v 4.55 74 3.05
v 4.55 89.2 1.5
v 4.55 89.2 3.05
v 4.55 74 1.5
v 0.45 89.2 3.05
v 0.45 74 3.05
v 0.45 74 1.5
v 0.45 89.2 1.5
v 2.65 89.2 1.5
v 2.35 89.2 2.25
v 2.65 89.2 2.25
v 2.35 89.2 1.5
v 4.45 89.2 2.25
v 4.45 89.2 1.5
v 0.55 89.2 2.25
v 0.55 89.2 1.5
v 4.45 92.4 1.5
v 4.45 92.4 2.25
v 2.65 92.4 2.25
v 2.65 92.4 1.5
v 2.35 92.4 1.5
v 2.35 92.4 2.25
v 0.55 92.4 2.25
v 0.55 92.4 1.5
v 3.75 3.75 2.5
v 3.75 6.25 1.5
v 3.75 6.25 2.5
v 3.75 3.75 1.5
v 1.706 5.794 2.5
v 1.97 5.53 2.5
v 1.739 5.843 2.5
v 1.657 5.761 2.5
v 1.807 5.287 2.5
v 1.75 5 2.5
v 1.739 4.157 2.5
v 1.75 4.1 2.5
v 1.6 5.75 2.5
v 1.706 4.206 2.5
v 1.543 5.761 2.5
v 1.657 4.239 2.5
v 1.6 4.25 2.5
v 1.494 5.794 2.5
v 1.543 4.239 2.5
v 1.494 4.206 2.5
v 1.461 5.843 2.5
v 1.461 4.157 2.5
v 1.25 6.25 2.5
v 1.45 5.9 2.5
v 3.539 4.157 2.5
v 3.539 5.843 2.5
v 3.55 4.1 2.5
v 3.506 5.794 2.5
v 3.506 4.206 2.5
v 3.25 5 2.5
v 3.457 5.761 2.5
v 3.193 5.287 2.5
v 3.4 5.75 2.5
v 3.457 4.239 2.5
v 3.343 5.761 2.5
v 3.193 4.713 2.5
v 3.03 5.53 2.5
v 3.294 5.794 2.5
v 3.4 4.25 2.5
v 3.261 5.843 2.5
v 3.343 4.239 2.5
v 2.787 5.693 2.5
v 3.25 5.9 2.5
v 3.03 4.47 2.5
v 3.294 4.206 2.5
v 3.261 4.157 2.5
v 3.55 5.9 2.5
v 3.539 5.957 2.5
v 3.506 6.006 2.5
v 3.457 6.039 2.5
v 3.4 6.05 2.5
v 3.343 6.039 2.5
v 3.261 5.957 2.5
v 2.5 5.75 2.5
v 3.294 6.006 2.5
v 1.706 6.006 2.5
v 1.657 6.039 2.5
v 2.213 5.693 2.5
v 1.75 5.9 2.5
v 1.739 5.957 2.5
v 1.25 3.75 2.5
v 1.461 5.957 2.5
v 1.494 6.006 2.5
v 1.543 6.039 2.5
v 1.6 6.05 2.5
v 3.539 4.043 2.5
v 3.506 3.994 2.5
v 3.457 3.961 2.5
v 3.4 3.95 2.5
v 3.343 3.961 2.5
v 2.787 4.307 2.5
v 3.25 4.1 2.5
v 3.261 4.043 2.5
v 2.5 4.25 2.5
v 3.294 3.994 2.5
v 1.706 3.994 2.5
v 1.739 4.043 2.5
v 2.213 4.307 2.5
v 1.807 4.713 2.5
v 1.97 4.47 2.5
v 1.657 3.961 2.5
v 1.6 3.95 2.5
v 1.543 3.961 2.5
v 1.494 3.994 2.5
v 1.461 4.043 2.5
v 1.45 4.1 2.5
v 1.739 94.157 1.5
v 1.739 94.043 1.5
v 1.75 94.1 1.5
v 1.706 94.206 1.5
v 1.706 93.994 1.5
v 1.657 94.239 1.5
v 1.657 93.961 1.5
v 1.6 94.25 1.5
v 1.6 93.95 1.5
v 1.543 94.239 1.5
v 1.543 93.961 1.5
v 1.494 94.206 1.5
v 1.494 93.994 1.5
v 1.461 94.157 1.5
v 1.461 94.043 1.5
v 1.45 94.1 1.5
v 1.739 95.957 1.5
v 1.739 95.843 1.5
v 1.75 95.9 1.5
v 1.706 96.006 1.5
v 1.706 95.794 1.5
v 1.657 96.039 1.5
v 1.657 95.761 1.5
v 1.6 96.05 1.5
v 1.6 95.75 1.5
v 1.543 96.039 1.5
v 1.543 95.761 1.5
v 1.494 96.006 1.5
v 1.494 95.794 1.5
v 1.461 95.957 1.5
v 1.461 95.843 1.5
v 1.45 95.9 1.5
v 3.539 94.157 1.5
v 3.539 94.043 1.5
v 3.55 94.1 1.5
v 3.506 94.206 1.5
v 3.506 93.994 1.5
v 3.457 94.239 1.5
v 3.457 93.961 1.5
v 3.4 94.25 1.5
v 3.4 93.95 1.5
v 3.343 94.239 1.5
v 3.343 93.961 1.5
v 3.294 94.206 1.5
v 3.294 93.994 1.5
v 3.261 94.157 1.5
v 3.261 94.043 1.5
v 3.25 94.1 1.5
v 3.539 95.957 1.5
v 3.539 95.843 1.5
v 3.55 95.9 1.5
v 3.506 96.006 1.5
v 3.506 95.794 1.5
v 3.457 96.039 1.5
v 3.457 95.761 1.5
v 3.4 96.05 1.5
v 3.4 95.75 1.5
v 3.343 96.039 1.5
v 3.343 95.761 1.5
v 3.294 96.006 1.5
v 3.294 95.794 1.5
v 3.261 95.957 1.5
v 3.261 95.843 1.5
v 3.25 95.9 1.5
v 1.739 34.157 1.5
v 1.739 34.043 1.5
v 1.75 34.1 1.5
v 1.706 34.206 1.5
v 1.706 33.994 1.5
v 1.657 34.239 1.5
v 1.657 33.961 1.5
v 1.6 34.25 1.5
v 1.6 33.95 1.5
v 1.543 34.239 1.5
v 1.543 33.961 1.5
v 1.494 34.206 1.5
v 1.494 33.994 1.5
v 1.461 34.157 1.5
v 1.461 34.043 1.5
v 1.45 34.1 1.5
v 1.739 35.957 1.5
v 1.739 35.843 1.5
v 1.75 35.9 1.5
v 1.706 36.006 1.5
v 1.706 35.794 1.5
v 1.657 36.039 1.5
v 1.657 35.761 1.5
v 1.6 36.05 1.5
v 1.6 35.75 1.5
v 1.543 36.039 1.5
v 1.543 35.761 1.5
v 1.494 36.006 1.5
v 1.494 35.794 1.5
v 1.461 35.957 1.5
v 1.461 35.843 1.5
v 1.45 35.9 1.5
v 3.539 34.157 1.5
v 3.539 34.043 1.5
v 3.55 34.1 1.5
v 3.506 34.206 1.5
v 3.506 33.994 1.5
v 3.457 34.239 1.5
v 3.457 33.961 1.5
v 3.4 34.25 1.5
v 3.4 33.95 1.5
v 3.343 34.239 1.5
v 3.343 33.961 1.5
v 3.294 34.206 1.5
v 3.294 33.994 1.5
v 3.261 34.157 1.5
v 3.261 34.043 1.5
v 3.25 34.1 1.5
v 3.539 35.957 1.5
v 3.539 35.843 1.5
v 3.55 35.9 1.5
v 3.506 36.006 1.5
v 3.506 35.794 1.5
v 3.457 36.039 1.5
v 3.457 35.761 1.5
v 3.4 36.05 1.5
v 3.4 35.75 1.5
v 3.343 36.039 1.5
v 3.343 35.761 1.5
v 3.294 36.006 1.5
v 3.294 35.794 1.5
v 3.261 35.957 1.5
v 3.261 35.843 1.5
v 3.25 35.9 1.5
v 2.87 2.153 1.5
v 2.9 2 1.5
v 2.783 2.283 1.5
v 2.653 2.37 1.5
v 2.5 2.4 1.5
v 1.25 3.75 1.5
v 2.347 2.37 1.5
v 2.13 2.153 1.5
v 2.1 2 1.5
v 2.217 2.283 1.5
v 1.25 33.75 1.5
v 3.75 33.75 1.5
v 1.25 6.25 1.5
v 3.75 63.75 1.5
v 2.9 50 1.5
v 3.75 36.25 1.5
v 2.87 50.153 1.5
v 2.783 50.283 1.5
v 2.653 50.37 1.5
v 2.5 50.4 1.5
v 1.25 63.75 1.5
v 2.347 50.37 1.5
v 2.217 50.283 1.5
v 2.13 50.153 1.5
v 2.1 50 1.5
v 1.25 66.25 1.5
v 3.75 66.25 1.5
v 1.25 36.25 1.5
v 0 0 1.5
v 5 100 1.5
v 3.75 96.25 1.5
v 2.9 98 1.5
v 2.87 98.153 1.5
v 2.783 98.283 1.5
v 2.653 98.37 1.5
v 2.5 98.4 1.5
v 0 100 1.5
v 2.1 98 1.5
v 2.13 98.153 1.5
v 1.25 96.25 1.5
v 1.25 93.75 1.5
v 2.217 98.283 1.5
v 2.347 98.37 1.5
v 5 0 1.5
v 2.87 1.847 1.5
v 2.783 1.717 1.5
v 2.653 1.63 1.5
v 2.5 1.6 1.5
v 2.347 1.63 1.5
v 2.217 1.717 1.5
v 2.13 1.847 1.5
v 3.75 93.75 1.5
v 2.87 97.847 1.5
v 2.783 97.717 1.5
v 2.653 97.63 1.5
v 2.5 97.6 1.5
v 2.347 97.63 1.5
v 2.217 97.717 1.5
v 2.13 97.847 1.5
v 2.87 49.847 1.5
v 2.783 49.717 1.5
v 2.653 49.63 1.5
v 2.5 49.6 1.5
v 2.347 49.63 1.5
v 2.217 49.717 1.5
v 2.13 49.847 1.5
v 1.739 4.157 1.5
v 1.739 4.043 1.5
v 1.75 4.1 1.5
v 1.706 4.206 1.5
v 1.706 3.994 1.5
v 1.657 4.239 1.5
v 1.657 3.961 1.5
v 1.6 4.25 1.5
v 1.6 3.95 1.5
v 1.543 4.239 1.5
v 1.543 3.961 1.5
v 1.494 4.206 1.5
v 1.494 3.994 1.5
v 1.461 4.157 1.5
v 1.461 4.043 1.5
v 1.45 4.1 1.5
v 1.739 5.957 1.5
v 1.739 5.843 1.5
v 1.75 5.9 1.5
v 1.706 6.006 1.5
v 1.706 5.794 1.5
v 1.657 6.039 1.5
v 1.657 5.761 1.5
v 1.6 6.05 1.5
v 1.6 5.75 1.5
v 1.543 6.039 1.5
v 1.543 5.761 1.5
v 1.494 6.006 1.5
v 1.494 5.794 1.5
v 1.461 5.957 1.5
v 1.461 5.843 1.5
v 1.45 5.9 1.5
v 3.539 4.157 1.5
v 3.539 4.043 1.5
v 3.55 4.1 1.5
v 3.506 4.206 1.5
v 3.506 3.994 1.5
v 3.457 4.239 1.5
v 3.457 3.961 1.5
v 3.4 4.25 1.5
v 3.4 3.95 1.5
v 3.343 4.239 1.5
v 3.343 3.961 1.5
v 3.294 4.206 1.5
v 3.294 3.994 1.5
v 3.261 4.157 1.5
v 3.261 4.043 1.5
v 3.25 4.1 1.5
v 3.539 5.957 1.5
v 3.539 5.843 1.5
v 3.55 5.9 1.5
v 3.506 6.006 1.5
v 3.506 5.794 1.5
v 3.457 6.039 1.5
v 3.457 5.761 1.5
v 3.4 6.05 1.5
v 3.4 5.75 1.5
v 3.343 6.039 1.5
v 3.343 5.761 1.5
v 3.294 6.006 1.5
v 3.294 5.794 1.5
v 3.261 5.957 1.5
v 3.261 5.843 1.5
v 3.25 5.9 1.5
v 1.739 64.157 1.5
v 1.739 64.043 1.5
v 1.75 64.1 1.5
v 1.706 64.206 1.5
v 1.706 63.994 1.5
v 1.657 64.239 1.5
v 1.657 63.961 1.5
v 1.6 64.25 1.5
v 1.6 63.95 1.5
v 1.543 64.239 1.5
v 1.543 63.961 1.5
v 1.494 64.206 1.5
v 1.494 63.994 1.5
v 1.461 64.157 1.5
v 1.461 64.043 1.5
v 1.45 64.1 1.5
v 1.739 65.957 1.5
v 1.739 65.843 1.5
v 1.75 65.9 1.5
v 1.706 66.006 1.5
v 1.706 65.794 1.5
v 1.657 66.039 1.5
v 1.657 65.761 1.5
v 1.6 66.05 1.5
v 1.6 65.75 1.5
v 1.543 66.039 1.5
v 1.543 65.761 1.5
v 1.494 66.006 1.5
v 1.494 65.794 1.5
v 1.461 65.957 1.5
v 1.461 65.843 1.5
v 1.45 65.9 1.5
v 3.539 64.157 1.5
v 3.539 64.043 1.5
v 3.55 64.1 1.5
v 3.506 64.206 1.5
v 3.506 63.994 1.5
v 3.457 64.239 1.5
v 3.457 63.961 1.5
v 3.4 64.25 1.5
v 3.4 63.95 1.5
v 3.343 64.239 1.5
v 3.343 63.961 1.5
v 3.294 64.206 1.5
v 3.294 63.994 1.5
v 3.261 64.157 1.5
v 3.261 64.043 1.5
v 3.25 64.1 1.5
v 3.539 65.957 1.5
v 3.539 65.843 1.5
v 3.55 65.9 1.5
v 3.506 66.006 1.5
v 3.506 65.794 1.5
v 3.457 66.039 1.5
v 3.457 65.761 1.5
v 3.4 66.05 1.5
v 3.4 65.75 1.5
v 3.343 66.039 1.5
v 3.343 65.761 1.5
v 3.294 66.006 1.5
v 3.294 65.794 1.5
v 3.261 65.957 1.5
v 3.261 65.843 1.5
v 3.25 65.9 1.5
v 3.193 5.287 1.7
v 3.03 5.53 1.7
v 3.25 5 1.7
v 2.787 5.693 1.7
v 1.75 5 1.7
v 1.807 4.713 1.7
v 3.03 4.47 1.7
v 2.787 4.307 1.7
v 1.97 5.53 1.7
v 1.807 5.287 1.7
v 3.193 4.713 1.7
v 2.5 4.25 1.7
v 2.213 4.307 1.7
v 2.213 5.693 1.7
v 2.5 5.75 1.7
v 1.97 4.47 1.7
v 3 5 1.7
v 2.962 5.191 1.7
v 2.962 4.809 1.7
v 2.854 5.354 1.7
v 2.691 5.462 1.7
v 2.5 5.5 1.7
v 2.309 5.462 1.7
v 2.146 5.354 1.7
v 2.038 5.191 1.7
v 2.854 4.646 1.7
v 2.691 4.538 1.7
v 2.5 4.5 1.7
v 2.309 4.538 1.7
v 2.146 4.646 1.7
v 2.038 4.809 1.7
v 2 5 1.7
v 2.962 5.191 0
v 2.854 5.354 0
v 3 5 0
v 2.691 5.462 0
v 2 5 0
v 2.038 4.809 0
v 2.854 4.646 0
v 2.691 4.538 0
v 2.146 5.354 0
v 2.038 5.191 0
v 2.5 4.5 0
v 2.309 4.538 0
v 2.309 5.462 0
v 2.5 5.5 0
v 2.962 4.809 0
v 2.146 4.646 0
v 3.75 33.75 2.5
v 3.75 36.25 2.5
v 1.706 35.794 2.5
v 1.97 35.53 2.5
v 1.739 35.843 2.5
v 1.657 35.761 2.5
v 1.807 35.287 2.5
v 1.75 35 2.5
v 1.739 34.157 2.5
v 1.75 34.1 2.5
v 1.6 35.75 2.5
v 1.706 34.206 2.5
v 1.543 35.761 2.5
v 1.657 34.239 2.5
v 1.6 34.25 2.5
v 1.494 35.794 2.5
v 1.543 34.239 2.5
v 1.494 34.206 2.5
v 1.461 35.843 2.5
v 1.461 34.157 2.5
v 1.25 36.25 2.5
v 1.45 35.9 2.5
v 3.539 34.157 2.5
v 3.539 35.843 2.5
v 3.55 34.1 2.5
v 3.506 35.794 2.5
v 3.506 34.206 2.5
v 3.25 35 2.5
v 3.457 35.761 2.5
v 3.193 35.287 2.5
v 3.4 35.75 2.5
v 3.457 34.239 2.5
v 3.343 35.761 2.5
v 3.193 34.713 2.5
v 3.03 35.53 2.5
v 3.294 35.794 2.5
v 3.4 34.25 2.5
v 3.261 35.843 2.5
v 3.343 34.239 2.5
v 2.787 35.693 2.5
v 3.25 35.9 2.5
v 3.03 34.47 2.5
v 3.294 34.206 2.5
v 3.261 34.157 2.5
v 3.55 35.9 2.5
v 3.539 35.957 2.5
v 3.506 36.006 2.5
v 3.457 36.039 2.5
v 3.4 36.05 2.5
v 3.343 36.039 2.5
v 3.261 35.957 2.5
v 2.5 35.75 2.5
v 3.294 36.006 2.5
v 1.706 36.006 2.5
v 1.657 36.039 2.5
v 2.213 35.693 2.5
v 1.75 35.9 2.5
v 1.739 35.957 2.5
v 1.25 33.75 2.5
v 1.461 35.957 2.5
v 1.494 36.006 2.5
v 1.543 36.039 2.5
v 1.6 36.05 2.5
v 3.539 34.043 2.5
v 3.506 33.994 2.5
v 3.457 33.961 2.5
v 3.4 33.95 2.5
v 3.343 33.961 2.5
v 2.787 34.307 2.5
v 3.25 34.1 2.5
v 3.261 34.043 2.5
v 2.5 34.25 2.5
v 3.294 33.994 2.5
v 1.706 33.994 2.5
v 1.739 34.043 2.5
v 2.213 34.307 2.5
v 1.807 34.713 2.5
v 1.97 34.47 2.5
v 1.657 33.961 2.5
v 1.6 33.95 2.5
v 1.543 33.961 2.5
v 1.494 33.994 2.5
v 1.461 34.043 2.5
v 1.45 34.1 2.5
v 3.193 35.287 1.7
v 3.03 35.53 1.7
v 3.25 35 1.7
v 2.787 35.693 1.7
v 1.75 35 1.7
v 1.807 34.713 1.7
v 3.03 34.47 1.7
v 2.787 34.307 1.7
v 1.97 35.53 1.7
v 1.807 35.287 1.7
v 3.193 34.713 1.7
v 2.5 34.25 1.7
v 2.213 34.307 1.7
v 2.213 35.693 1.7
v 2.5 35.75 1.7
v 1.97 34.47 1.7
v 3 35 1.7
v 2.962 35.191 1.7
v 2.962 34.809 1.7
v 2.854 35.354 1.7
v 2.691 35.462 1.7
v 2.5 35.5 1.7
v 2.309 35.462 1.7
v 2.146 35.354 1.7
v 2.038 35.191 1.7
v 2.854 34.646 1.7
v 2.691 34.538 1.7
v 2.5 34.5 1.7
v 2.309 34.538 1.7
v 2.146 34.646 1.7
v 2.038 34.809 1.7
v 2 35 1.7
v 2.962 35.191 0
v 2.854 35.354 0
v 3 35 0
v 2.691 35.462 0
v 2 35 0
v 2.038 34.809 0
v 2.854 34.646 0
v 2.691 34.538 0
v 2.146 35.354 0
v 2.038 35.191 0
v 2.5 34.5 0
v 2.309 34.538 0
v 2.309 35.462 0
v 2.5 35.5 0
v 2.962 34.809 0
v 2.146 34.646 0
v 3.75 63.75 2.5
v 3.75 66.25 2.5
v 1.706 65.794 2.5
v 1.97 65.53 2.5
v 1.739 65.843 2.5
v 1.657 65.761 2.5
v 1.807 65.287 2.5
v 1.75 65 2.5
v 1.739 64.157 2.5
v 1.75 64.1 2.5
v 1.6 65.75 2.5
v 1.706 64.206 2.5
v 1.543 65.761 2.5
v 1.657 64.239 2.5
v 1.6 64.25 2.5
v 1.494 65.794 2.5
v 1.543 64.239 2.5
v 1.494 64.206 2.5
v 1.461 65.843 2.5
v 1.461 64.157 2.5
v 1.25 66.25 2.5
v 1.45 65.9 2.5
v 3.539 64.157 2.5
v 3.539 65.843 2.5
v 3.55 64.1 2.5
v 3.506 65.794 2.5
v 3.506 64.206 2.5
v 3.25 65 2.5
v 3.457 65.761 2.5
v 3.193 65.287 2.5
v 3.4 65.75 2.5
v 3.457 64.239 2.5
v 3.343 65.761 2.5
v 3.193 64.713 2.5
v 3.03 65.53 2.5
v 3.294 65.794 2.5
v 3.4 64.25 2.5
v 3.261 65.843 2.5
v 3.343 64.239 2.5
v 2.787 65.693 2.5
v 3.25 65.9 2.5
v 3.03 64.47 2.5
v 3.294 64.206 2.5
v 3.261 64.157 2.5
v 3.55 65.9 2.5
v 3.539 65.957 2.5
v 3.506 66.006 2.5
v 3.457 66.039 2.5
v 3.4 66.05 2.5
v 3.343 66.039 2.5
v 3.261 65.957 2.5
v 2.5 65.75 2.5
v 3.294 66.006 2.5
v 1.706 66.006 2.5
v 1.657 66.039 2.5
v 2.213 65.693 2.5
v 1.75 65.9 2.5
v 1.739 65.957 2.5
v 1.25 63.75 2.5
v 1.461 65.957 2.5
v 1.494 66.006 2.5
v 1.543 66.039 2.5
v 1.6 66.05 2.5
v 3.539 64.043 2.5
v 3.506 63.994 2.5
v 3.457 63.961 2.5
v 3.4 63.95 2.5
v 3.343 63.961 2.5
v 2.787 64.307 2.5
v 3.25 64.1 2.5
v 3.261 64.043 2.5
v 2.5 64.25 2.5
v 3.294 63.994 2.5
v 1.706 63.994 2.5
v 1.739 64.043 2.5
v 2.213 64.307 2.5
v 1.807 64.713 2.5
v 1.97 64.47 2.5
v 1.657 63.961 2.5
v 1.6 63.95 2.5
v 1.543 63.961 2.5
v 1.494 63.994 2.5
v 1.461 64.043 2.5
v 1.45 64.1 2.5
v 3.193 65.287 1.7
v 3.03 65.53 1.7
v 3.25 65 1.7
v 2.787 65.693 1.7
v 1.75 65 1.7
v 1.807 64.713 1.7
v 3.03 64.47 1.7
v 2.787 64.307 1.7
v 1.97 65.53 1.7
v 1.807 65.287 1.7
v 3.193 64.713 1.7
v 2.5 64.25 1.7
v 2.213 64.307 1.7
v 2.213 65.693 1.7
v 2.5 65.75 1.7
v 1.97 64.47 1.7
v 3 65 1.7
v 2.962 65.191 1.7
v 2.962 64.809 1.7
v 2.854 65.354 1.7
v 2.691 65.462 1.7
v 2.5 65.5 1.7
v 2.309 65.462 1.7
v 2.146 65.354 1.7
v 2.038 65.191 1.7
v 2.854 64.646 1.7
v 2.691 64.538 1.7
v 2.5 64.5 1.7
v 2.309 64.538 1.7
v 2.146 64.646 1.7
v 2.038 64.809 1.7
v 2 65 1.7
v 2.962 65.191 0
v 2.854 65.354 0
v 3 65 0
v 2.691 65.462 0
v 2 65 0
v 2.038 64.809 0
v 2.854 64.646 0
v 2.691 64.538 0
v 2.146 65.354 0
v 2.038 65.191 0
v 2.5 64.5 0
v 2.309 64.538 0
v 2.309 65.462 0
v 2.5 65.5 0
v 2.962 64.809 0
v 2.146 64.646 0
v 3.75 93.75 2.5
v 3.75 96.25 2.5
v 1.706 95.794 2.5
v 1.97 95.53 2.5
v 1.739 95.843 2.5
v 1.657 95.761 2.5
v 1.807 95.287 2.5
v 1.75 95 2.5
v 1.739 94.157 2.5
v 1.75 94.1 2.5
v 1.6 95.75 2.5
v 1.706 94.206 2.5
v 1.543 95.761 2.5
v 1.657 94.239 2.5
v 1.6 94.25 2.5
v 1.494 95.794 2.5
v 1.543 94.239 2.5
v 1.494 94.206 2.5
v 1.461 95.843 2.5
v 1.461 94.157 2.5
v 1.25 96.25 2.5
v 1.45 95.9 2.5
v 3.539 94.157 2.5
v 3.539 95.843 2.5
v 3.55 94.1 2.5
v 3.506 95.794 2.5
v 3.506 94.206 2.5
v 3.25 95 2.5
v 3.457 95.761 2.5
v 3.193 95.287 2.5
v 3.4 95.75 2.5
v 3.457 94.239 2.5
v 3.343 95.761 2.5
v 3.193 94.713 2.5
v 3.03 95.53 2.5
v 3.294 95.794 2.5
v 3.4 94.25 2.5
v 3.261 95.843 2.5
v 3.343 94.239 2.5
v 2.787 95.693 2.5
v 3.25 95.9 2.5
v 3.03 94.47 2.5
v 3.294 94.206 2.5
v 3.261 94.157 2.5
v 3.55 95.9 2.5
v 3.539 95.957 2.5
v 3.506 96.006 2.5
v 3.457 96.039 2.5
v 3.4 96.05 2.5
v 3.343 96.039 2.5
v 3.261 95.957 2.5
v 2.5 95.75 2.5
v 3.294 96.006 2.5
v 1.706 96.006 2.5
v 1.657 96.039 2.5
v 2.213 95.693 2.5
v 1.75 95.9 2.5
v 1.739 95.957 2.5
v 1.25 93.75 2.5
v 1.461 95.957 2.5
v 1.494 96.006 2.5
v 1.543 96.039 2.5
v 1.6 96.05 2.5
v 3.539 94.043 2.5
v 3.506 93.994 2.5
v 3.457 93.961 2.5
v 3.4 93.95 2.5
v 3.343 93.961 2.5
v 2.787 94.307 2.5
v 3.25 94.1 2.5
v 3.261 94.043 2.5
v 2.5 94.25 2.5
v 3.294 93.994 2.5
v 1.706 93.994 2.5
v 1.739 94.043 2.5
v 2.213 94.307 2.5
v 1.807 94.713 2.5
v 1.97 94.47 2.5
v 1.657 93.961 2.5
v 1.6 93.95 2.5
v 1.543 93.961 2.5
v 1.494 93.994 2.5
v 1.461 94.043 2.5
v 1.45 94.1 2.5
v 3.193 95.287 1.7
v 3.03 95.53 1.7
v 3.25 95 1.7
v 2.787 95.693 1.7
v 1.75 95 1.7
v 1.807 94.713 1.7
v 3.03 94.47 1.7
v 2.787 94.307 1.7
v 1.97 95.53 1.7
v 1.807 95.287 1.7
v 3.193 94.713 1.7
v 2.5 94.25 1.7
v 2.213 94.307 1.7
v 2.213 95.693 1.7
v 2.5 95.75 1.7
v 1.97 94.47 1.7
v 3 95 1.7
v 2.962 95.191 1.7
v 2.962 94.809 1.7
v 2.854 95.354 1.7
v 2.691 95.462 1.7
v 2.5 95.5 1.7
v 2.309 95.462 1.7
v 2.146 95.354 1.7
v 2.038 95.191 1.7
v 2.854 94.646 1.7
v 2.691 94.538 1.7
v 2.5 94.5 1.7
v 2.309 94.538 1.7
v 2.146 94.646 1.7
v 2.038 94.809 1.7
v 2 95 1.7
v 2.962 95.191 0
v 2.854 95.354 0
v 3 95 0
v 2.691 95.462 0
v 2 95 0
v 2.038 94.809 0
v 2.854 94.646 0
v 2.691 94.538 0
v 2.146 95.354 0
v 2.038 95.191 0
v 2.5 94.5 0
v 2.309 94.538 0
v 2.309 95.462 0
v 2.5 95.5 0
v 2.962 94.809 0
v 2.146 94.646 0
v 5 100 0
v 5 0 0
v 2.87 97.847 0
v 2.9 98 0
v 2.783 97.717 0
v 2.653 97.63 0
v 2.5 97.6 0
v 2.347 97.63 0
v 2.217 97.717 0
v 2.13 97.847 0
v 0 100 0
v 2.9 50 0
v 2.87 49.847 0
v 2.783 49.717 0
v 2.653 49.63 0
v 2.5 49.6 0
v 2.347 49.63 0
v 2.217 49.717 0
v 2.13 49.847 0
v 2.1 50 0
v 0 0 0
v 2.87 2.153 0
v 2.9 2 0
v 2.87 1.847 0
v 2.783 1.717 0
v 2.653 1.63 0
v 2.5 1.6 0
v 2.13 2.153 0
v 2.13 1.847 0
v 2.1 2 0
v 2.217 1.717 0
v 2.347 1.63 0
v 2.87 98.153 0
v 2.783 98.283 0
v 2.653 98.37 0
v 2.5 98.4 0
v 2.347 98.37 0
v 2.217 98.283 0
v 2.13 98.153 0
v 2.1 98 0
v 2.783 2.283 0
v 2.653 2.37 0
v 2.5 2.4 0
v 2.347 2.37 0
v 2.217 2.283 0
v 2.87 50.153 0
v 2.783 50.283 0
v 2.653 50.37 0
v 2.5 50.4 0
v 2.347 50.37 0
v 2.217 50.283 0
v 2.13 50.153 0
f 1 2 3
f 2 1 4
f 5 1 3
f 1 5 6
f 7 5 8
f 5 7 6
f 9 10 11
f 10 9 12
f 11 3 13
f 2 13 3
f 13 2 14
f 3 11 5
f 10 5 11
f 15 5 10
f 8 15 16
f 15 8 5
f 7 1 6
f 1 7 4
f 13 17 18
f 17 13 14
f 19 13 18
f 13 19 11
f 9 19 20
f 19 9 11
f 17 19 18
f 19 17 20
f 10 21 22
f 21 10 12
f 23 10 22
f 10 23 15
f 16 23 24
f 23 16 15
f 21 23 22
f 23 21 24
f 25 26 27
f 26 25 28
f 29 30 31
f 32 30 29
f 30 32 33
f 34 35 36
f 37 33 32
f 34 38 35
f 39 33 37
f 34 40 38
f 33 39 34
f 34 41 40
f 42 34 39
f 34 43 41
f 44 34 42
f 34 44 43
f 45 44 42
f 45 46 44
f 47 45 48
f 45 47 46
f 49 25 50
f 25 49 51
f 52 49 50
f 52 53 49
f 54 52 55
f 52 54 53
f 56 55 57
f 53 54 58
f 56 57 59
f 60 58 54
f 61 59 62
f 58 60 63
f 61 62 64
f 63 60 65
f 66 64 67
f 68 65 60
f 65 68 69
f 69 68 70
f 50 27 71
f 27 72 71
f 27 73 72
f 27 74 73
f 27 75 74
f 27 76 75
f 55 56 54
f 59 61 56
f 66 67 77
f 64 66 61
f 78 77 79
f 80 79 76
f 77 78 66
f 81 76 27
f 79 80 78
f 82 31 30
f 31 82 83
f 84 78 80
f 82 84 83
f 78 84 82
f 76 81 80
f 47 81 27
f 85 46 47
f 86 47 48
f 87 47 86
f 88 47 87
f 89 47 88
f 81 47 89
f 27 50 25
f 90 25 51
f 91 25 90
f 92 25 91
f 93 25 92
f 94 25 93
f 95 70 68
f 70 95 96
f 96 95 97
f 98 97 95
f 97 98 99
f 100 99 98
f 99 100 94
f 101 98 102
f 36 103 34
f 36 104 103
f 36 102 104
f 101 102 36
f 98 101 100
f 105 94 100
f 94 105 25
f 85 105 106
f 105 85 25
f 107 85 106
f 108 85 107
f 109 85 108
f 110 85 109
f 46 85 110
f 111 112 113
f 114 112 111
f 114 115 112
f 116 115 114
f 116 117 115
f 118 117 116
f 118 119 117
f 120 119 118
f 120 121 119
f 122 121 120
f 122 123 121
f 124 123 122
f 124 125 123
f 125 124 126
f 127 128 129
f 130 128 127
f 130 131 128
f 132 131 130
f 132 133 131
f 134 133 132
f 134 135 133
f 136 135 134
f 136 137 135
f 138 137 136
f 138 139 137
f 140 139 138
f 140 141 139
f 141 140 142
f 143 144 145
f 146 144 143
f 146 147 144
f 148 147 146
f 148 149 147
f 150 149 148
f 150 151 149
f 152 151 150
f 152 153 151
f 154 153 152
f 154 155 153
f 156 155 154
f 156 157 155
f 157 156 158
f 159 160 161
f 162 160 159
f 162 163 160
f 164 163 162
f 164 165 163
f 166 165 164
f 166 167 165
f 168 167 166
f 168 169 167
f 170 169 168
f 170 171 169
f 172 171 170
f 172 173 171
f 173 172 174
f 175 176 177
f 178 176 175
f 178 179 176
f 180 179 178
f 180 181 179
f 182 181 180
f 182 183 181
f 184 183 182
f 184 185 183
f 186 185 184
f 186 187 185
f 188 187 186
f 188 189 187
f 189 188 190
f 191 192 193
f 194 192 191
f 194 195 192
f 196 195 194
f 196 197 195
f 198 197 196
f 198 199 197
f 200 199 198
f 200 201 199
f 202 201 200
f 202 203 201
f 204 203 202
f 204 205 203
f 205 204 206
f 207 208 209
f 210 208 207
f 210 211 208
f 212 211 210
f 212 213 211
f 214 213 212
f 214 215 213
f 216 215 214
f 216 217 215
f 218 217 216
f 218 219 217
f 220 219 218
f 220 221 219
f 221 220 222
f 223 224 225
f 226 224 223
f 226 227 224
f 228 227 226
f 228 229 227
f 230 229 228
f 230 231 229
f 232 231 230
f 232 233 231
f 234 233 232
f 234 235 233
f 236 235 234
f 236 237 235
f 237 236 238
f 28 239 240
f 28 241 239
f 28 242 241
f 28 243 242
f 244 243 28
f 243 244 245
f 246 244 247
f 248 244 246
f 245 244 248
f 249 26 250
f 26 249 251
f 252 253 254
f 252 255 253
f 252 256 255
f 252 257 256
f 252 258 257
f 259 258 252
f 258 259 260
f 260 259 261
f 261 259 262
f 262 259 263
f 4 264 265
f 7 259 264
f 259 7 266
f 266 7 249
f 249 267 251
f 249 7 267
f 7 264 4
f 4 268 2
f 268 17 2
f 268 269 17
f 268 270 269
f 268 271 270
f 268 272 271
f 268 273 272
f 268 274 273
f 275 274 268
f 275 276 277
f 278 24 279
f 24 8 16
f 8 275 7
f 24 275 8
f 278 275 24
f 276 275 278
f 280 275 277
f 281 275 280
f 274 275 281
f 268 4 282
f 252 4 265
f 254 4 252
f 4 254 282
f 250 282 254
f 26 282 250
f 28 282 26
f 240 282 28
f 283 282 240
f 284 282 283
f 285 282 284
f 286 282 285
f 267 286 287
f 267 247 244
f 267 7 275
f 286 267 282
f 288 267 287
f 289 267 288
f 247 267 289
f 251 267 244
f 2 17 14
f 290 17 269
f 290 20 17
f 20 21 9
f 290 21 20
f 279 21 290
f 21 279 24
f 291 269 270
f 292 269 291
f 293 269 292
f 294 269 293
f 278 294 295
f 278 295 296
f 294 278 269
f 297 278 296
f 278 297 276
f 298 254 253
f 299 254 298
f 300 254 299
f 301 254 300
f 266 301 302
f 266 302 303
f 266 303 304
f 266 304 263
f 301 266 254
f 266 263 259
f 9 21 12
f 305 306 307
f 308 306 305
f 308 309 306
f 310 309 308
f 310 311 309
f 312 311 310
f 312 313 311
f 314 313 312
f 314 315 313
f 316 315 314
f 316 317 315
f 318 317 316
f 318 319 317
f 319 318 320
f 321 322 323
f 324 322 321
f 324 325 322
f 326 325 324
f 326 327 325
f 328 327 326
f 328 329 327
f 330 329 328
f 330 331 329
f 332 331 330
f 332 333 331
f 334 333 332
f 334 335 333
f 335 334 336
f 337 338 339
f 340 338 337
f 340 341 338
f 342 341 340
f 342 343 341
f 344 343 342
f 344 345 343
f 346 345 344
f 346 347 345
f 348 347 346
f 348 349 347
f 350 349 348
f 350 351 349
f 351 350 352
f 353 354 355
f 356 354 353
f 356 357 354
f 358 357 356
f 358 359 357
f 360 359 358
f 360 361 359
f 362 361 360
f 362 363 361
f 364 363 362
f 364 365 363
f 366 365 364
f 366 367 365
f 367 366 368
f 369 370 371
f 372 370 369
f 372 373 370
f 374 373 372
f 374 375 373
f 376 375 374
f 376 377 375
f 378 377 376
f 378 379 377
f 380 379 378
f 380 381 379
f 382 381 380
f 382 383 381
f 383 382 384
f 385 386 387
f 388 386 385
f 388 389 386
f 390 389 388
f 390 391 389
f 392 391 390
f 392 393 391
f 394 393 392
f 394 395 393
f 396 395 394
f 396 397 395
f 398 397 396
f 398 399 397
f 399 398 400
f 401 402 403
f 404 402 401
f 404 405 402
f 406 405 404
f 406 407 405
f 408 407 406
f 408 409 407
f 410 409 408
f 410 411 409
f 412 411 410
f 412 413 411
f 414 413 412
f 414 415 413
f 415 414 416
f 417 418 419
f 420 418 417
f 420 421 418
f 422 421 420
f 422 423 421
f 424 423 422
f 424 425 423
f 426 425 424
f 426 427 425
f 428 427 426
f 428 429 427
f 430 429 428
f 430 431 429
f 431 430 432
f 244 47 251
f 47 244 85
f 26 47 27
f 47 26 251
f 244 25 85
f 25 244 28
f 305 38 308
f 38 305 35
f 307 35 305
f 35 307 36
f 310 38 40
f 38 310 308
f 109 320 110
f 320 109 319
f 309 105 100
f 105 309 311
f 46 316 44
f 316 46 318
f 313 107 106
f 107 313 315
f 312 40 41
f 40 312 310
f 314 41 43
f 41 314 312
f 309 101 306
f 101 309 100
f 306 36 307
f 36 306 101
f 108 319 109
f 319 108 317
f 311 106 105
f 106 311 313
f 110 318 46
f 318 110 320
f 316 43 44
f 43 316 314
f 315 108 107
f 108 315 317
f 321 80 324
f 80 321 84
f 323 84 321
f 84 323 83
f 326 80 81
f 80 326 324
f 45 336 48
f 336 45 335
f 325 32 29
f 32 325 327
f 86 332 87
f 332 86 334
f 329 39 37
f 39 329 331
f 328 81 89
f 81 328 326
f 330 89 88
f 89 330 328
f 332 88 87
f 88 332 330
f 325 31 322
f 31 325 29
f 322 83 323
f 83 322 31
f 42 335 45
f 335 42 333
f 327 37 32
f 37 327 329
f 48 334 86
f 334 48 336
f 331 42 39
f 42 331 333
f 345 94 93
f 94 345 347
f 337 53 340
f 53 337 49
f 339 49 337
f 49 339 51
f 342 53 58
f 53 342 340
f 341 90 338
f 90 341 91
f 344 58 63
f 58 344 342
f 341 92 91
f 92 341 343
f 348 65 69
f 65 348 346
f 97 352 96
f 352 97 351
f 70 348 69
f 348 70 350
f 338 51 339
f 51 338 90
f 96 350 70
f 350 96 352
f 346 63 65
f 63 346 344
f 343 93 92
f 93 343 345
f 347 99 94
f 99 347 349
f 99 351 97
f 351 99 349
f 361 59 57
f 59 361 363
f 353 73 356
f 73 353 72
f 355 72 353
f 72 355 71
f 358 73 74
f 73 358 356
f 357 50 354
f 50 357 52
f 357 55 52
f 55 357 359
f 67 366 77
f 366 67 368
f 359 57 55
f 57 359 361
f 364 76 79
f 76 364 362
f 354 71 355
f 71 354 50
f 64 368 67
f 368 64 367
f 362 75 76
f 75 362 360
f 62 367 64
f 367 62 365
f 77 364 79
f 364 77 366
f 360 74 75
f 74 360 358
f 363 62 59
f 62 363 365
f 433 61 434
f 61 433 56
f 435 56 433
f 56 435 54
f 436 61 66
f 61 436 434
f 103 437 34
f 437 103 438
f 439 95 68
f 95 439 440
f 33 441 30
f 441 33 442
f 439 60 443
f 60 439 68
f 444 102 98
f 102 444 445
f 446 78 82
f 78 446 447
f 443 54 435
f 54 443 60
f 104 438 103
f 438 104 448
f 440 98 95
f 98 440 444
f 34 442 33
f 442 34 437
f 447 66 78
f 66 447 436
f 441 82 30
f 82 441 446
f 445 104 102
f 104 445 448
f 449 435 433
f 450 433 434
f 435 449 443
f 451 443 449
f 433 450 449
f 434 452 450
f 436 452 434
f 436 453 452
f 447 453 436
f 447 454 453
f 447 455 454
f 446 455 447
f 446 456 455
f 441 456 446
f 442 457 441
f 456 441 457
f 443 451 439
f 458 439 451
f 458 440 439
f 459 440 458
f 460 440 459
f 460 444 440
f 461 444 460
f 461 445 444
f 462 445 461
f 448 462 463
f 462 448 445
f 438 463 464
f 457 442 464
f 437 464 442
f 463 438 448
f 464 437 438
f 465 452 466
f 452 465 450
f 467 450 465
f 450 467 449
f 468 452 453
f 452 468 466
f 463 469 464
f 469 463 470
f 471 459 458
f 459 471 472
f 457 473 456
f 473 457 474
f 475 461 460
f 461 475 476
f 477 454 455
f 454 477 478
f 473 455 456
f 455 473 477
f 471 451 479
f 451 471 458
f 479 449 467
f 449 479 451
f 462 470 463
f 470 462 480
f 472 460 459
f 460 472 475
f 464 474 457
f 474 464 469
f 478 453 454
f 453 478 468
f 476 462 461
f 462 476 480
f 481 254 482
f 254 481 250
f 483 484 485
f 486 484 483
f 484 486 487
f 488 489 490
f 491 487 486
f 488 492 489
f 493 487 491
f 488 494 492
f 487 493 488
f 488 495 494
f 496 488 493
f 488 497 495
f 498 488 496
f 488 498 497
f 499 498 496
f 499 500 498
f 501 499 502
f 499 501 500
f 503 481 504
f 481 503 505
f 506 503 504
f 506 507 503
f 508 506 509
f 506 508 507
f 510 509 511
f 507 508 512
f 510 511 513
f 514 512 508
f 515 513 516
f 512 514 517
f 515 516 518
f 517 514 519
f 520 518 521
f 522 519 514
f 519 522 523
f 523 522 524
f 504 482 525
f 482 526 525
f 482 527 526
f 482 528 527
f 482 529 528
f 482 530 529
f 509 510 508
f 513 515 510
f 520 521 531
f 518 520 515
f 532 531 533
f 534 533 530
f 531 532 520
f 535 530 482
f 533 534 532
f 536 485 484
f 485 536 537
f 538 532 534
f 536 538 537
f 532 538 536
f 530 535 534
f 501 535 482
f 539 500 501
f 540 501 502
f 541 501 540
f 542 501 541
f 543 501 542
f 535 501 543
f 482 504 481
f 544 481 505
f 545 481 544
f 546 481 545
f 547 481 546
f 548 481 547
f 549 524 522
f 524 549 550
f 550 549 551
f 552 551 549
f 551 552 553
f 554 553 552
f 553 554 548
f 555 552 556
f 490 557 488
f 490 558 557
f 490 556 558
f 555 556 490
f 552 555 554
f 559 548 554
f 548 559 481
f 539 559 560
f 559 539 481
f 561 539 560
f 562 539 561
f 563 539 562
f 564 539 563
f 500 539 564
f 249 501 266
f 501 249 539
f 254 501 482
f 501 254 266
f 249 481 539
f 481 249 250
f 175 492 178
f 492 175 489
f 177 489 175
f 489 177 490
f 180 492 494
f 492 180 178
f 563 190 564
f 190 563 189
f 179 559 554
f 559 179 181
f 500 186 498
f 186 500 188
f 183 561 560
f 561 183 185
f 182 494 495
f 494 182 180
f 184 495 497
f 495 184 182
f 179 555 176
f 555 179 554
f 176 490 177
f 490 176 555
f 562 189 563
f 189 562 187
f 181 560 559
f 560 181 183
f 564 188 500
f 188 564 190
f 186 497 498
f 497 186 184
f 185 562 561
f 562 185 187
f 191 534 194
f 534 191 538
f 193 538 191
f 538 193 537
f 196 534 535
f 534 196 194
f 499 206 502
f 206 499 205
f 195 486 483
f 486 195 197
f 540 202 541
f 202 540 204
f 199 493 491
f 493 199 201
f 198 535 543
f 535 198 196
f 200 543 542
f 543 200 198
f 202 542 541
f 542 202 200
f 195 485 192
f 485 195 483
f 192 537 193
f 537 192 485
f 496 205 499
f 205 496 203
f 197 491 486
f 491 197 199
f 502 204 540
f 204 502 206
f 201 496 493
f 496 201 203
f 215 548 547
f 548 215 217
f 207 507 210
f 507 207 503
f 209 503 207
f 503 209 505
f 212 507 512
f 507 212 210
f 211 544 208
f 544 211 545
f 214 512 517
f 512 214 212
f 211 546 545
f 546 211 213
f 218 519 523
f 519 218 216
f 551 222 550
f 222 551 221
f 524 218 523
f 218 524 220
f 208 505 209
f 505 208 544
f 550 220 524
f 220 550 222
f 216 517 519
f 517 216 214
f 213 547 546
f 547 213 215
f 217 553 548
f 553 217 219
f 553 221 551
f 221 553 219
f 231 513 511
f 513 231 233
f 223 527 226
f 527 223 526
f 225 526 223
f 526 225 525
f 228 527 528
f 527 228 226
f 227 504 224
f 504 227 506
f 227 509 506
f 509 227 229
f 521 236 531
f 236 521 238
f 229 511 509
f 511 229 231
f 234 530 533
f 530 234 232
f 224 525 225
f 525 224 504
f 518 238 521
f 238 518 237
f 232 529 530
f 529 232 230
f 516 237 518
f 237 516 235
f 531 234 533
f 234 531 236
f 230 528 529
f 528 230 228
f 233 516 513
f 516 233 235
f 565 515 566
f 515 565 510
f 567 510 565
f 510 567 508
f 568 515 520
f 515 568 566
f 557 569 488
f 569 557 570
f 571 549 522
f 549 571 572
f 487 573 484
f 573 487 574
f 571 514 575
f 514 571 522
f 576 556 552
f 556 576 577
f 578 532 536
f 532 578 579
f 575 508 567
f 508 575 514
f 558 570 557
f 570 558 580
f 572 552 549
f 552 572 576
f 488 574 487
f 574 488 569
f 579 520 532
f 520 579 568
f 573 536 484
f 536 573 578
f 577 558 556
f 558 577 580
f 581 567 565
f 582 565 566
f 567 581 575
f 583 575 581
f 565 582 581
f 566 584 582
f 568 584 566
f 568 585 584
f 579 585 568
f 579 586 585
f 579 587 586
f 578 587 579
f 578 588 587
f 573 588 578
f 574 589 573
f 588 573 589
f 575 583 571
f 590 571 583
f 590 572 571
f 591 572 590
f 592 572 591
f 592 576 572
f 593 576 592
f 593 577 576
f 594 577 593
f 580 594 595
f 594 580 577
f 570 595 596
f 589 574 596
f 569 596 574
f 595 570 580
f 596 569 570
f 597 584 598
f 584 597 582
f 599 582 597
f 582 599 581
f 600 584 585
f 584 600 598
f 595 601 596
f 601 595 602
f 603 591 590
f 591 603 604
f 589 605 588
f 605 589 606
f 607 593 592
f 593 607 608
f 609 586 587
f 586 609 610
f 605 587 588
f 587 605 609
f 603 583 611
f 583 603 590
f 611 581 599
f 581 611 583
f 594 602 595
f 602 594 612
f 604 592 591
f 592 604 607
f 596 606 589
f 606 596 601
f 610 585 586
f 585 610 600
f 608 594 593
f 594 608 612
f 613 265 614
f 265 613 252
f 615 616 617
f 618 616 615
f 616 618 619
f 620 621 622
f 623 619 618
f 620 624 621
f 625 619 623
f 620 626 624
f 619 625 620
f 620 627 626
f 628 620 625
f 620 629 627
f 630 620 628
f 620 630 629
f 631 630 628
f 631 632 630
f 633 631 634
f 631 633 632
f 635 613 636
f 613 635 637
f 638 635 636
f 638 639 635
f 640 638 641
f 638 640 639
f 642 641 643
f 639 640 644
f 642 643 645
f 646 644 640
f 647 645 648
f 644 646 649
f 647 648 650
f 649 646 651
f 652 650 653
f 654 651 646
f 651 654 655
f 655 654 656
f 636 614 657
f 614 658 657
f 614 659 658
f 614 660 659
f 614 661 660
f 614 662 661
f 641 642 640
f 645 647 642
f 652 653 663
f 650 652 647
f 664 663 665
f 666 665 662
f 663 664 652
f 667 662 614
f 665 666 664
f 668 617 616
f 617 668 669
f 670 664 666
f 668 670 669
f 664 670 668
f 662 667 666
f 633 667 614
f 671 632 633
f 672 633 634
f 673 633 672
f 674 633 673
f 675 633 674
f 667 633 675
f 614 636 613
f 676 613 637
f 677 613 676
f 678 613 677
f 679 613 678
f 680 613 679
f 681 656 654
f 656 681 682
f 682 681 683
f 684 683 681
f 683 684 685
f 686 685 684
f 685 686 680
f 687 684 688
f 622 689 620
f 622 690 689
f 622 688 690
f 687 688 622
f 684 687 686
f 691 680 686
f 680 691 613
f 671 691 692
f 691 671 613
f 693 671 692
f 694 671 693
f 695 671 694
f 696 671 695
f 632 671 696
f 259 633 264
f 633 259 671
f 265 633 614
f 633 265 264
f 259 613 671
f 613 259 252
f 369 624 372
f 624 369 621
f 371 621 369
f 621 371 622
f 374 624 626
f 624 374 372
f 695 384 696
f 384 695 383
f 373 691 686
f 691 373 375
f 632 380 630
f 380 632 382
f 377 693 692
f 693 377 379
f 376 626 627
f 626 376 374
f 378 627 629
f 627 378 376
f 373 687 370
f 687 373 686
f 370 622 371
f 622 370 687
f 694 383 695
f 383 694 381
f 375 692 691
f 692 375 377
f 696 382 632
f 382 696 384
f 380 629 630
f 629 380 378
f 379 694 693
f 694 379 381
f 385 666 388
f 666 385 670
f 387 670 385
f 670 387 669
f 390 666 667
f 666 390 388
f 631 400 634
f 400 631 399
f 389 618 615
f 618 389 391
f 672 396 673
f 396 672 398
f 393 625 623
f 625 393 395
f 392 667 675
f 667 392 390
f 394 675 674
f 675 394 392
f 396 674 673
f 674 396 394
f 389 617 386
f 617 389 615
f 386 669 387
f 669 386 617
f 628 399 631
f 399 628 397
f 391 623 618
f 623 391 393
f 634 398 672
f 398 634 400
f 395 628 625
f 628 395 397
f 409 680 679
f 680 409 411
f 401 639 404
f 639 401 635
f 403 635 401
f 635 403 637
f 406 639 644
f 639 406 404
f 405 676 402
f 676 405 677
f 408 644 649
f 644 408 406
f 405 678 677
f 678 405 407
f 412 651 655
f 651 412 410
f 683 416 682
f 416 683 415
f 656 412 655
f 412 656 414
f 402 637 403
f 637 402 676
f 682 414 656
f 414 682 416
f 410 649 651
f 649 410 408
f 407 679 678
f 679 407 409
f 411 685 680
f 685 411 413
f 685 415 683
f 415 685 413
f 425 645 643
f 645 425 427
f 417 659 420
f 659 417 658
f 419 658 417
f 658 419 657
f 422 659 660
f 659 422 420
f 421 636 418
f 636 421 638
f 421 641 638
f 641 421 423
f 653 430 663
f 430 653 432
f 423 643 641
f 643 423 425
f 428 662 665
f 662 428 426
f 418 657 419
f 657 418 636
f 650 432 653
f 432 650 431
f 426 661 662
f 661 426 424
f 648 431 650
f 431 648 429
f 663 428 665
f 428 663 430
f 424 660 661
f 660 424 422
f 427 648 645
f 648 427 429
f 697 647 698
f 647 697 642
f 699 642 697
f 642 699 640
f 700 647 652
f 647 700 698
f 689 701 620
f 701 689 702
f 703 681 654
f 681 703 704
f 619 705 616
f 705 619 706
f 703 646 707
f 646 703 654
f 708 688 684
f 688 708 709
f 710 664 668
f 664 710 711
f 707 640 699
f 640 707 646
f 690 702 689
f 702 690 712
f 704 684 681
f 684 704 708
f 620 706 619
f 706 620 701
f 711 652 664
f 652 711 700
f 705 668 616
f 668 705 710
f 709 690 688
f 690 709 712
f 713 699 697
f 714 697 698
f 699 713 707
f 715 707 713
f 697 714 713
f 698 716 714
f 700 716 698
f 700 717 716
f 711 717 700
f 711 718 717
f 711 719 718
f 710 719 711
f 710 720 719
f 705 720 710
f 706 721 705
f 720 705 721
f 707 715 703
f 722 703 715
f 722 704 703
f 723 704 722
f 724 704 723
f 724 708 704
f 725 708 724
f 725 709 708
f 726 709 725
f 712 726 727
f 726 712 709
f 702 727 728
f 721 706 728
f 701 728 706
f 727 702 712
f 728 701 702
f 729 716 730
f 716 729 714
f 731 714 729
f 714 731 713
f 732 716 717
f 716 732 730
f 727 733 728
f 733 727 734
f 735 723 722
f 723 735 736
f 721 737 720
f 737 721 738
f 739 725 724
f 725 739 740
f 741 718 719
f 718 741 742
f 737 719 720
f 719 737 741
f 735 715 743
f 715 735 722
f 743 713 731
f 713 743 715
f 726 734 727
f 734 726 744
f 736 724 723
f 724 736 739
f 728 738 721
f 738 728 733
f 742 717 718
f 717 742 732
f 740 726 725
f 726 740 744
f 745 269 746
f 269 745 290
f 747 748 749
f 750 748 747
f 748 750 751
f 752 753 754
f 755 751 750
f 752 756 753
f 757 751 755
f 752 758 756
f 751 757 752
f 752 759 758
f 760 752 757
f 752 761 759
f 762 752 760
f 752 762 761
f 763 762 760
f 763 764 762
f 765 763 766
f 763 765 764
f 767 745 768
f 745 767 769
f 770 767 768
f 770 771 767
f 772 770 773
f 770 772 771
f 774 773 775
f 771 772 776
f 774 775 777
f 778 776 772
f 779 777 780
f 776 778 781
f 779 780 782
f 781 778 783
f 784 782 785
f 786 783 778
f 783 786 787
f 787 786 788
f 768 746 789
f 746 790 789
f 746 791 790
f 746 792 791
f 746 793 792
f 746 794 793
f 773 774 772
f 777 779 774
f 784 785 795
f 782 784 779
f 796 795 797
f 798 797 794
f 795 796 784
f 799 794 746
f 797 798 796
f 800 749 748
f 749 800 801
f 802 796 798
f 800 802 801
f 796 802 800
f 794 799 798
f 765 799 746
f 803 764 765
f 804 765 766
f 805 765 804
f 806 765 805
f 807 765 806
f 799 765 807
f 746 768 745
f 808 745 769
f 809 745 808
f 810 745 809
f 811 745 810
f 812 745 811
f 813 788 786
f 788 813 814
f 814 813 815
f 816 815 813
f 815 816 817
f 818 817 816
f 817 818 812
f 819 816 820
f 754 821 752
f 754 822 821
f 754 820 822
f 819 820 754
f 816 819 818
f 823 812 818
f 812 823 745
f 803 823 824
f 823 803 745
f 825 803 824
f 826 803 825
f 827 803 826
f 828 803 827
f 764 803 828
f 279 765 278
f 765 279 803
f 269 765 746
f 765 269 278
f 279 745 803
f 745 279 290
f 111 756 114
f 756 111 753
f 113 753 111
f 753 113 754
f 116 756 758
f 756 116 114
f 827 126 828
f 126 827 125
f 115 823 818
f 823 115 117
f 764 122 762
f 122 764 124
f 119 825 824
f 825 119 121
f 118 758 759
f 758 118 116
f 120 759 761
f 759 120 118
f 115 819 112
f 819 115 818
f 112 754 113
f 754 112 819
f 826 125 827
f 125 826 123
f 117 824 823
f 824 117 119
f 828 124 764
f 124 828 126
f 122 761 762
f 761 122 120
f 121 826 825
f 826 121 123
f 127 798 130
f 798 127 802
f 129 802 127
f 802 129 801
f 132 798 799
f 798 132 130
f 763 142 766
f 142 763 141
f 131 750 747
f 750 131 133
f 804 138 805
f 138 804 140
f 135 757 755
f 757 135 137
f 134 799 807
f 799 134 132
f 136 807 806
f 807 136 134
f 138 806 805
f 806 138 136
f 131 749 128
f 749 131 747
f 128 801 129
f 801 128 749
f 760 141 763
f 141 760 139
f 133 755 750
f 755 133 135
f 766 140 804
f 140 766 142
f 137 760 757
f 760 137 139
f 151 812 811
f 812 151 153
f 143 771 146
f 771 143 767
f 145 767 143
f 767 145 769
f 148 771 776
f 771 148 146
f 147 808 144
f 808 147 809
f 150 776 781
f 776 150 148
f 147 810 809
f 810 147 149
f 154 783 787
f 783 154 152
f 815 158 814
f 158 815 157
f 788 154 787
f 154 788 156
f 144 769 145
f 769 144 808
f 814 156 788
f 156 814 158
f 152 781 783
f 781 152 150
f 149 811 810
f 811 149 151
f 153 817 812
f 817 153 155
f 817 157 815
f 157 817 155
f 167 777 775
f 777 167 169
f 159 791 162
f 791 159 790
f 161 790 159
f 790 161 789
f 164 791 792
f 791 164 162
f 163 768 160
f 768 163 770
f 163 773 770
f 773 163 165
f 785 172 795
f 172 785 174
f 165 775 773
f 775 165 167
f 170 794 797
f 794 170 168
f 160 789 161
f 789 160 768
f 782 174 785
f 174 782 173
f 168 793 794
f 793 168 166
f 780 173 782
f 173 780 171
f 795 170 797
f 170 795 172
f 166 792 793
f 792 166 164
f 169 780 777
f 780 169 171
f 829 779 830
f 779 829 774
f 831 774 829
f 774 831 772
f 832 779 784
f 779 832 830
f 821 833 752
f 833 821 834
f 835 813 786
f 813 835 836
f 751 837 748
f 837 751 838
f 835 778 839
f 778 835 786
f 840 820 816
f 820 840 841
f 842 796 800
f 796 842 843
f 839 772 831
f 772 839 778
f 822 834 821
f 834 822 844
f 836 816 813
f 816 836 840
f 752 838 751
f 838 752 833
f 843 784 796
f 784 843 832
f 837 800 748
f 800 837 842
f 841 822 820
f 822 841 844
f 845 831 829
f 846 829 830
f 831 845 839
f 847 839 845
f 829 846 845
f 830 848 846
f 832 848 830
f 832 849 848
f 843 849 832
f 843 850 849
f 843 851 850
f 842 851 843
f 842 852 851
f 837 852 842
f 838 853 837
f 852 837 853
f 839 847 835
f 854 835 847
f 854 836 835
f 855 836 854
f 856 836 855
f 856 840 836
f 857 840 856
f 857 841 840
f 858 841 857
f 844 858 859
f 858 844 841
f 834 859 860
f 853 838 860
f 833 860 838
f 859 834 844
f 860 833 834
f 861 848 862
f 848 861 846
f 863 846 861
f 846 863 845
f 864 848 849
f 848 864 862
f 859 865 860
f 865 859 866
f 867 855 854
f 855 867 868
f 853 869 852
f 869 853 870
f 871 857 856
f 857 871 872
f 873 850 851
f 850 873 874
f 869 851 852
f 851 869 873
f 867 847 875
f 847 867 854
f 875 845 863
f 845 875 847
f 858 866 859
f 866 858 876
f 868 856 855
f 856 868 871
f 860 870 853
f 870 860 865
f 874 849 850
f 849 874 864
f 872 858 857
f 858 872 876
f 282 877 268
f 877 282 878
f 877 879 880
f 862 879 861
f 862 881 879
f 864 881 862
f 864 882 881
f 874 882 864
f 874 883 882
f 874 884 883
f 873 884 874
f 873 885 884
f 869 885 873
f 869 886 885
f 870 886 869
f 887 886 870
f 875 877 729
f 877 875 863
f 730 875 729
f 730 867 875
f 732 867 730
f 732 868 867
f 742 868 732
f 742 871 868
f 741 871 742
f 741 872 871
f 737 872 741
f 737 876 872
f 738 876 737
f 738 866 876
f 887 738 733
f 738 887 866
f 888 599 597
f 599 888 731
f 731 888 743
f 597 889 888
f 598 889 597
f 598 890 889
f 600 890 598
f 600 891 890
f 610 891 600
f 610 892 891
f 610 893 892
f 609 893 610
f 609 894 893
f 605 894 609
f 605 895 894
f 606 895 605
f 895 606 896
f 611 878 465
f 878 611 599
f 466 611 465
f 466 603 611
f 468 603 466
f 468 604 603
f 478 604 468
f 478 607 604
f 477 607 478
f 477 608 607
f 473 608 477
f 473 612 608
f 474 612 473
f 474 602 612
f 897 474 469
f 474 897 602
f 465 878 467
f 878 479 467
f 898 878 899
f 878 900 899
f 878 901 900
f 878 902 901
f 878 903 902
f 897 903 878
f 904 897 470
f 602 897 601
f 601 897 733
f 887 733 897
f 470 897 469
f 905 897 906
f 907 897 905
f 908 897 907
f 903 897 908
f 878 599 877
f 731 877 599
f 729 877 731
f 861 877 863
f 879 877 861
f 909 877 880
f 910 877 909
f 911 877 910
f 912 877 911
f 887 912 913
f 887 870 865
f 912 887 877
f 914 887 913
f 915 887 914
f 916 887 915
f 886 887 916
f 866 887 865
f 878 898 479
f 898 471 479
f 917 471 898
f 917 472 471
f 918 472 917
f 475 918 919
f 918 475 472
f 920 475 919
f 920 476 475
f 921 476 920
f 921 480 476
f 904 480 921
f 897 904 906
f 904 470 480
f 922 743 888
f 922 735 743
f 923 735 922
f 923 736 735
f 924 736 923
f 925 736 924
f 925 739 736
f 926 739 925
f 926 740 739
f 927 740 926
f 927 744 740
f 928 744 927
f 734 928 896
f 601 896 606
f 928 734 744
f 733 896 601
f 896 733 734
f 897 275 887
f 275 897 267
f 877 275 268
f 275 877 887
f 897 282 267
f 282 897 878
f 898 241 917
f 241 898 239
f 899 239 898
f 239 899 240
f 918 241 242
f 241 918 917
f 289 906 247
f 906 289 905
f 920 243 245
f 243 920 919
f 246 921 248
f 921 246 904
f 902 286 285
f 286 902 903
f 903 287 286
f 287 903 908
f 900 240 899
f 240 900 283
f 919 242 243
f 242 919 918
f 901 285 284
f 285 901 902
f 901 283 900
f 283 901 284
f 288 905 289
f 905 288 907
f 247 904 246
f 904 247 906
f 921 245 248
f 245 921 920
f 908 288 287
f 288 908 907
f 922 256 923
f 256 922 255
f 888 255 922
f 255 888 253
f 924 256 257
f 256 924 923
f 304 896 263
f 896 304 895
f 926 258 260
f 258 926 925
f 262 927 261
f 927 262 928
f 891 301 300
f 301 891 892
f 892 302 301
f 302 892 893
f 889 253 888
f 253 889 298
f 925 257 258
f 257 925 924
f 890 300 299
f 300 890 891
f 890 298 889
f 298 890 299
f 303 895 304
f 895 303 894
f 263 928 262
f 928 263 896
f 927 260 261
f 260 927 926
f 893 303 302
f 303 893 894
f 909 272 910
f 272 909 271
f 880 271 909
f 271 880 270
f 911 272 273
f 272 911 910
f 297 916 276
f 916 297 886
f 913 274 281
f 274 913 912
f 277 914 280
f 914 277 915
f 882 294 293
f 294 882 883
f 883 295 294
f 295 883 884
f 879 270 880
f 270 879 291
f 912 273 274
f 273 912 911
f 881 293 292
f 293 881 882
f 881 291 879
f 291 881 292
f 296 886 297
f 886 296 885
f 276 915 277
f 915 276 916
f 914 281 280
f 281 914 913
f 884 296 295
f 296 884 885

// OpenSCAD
$fn = 16;

module blocchetto_laser() {
    difference() {
        cube([2.5, 2.5, 1]);    
        
        translate([0.35, 0.35, 0])
            cylinder(3, 0.15, 0.15, center = true);
        translate([0.35, 2.15, 0])
            cylinder(3, 0.15, 0.15, center = true);
        translate([2.15, 0.35, 0])
            cylinder(3, 0.15, 0.15, center = true);
        translate([2.15, 2.15, 0])
            cylinder(3, 0.15, 0.15, center = true);
        translate([1.25, 1.25, 0.2])
            cylinder(3, 0.75, 0.75);
        translate([1.25, 1.25, -0.1])
            cylinder(3, 0.5, 0.5);
    }
}

module laser_module() {
    translate([0, 0, -0.1])
        cylinder(h=3.2, r=0.5);
}

module locking_module() {
    translate([0, 0, -0.1])
        cylinder(h=2.2, r=0.4);
}

module dmx_driver_module() {
    translate([1.375, 5.25, 0.75])
    color([0.5, 0.5, 0.5])
        cylinder(h=1, r=0.15);
    translate([-1.375, 5.25, 0.75])
    color([0.5, 0.5, 0.5])
        cylinder(h=1, r=0.15);
    translate([-0.7, -5.25, 0.75])
    color([0.5, 0.5, 0.5])
        cylinder(h=1, r=0.15);
}

module dmx_driver() {
    color([0.2, 0.2, 0.2])
        cube([4.1, 15.2, 2.3]);
    translate([2.2, 13.6, 0])
    color([0.8, 0.8, 0])
        cube([1.8, 4.8, 1.5]);
    translate([0.1, 13.6, 0])
    color([0.8, 0.8, 0])
        cube([1.8, 4.8, 1.5]);
}

$fa = 2;
$fs = 0.2;

translate([0.45, 74, 0.75]) dmx_driver();

translate([1.25, 3.75, 1.5]) blocchetto_laser();
translate([1.25, 33.75, 1.5]) blocchetto_laser();
translate([1.25, 63.75, 1.5]) blocchetto_laser();
translate([1.25, 93.75, 1.5]) blocchetto_laser();

difference() {
    cube([5, 100, 1.5]);

    translate([2.5, 2, 0]) locking_module();
    translate([2.5, 50, 0]) locking_module();
    translate([2.5, 98, 0]) locking_module();
    
    translate([2.5, 5, 0]) laser_module();
    translate([2.5, 35, 0]) laser_module();
    translate([2.5, 65, 0]) laser_module();
    translate([2.5, 95, 0]) laser_module();
}
